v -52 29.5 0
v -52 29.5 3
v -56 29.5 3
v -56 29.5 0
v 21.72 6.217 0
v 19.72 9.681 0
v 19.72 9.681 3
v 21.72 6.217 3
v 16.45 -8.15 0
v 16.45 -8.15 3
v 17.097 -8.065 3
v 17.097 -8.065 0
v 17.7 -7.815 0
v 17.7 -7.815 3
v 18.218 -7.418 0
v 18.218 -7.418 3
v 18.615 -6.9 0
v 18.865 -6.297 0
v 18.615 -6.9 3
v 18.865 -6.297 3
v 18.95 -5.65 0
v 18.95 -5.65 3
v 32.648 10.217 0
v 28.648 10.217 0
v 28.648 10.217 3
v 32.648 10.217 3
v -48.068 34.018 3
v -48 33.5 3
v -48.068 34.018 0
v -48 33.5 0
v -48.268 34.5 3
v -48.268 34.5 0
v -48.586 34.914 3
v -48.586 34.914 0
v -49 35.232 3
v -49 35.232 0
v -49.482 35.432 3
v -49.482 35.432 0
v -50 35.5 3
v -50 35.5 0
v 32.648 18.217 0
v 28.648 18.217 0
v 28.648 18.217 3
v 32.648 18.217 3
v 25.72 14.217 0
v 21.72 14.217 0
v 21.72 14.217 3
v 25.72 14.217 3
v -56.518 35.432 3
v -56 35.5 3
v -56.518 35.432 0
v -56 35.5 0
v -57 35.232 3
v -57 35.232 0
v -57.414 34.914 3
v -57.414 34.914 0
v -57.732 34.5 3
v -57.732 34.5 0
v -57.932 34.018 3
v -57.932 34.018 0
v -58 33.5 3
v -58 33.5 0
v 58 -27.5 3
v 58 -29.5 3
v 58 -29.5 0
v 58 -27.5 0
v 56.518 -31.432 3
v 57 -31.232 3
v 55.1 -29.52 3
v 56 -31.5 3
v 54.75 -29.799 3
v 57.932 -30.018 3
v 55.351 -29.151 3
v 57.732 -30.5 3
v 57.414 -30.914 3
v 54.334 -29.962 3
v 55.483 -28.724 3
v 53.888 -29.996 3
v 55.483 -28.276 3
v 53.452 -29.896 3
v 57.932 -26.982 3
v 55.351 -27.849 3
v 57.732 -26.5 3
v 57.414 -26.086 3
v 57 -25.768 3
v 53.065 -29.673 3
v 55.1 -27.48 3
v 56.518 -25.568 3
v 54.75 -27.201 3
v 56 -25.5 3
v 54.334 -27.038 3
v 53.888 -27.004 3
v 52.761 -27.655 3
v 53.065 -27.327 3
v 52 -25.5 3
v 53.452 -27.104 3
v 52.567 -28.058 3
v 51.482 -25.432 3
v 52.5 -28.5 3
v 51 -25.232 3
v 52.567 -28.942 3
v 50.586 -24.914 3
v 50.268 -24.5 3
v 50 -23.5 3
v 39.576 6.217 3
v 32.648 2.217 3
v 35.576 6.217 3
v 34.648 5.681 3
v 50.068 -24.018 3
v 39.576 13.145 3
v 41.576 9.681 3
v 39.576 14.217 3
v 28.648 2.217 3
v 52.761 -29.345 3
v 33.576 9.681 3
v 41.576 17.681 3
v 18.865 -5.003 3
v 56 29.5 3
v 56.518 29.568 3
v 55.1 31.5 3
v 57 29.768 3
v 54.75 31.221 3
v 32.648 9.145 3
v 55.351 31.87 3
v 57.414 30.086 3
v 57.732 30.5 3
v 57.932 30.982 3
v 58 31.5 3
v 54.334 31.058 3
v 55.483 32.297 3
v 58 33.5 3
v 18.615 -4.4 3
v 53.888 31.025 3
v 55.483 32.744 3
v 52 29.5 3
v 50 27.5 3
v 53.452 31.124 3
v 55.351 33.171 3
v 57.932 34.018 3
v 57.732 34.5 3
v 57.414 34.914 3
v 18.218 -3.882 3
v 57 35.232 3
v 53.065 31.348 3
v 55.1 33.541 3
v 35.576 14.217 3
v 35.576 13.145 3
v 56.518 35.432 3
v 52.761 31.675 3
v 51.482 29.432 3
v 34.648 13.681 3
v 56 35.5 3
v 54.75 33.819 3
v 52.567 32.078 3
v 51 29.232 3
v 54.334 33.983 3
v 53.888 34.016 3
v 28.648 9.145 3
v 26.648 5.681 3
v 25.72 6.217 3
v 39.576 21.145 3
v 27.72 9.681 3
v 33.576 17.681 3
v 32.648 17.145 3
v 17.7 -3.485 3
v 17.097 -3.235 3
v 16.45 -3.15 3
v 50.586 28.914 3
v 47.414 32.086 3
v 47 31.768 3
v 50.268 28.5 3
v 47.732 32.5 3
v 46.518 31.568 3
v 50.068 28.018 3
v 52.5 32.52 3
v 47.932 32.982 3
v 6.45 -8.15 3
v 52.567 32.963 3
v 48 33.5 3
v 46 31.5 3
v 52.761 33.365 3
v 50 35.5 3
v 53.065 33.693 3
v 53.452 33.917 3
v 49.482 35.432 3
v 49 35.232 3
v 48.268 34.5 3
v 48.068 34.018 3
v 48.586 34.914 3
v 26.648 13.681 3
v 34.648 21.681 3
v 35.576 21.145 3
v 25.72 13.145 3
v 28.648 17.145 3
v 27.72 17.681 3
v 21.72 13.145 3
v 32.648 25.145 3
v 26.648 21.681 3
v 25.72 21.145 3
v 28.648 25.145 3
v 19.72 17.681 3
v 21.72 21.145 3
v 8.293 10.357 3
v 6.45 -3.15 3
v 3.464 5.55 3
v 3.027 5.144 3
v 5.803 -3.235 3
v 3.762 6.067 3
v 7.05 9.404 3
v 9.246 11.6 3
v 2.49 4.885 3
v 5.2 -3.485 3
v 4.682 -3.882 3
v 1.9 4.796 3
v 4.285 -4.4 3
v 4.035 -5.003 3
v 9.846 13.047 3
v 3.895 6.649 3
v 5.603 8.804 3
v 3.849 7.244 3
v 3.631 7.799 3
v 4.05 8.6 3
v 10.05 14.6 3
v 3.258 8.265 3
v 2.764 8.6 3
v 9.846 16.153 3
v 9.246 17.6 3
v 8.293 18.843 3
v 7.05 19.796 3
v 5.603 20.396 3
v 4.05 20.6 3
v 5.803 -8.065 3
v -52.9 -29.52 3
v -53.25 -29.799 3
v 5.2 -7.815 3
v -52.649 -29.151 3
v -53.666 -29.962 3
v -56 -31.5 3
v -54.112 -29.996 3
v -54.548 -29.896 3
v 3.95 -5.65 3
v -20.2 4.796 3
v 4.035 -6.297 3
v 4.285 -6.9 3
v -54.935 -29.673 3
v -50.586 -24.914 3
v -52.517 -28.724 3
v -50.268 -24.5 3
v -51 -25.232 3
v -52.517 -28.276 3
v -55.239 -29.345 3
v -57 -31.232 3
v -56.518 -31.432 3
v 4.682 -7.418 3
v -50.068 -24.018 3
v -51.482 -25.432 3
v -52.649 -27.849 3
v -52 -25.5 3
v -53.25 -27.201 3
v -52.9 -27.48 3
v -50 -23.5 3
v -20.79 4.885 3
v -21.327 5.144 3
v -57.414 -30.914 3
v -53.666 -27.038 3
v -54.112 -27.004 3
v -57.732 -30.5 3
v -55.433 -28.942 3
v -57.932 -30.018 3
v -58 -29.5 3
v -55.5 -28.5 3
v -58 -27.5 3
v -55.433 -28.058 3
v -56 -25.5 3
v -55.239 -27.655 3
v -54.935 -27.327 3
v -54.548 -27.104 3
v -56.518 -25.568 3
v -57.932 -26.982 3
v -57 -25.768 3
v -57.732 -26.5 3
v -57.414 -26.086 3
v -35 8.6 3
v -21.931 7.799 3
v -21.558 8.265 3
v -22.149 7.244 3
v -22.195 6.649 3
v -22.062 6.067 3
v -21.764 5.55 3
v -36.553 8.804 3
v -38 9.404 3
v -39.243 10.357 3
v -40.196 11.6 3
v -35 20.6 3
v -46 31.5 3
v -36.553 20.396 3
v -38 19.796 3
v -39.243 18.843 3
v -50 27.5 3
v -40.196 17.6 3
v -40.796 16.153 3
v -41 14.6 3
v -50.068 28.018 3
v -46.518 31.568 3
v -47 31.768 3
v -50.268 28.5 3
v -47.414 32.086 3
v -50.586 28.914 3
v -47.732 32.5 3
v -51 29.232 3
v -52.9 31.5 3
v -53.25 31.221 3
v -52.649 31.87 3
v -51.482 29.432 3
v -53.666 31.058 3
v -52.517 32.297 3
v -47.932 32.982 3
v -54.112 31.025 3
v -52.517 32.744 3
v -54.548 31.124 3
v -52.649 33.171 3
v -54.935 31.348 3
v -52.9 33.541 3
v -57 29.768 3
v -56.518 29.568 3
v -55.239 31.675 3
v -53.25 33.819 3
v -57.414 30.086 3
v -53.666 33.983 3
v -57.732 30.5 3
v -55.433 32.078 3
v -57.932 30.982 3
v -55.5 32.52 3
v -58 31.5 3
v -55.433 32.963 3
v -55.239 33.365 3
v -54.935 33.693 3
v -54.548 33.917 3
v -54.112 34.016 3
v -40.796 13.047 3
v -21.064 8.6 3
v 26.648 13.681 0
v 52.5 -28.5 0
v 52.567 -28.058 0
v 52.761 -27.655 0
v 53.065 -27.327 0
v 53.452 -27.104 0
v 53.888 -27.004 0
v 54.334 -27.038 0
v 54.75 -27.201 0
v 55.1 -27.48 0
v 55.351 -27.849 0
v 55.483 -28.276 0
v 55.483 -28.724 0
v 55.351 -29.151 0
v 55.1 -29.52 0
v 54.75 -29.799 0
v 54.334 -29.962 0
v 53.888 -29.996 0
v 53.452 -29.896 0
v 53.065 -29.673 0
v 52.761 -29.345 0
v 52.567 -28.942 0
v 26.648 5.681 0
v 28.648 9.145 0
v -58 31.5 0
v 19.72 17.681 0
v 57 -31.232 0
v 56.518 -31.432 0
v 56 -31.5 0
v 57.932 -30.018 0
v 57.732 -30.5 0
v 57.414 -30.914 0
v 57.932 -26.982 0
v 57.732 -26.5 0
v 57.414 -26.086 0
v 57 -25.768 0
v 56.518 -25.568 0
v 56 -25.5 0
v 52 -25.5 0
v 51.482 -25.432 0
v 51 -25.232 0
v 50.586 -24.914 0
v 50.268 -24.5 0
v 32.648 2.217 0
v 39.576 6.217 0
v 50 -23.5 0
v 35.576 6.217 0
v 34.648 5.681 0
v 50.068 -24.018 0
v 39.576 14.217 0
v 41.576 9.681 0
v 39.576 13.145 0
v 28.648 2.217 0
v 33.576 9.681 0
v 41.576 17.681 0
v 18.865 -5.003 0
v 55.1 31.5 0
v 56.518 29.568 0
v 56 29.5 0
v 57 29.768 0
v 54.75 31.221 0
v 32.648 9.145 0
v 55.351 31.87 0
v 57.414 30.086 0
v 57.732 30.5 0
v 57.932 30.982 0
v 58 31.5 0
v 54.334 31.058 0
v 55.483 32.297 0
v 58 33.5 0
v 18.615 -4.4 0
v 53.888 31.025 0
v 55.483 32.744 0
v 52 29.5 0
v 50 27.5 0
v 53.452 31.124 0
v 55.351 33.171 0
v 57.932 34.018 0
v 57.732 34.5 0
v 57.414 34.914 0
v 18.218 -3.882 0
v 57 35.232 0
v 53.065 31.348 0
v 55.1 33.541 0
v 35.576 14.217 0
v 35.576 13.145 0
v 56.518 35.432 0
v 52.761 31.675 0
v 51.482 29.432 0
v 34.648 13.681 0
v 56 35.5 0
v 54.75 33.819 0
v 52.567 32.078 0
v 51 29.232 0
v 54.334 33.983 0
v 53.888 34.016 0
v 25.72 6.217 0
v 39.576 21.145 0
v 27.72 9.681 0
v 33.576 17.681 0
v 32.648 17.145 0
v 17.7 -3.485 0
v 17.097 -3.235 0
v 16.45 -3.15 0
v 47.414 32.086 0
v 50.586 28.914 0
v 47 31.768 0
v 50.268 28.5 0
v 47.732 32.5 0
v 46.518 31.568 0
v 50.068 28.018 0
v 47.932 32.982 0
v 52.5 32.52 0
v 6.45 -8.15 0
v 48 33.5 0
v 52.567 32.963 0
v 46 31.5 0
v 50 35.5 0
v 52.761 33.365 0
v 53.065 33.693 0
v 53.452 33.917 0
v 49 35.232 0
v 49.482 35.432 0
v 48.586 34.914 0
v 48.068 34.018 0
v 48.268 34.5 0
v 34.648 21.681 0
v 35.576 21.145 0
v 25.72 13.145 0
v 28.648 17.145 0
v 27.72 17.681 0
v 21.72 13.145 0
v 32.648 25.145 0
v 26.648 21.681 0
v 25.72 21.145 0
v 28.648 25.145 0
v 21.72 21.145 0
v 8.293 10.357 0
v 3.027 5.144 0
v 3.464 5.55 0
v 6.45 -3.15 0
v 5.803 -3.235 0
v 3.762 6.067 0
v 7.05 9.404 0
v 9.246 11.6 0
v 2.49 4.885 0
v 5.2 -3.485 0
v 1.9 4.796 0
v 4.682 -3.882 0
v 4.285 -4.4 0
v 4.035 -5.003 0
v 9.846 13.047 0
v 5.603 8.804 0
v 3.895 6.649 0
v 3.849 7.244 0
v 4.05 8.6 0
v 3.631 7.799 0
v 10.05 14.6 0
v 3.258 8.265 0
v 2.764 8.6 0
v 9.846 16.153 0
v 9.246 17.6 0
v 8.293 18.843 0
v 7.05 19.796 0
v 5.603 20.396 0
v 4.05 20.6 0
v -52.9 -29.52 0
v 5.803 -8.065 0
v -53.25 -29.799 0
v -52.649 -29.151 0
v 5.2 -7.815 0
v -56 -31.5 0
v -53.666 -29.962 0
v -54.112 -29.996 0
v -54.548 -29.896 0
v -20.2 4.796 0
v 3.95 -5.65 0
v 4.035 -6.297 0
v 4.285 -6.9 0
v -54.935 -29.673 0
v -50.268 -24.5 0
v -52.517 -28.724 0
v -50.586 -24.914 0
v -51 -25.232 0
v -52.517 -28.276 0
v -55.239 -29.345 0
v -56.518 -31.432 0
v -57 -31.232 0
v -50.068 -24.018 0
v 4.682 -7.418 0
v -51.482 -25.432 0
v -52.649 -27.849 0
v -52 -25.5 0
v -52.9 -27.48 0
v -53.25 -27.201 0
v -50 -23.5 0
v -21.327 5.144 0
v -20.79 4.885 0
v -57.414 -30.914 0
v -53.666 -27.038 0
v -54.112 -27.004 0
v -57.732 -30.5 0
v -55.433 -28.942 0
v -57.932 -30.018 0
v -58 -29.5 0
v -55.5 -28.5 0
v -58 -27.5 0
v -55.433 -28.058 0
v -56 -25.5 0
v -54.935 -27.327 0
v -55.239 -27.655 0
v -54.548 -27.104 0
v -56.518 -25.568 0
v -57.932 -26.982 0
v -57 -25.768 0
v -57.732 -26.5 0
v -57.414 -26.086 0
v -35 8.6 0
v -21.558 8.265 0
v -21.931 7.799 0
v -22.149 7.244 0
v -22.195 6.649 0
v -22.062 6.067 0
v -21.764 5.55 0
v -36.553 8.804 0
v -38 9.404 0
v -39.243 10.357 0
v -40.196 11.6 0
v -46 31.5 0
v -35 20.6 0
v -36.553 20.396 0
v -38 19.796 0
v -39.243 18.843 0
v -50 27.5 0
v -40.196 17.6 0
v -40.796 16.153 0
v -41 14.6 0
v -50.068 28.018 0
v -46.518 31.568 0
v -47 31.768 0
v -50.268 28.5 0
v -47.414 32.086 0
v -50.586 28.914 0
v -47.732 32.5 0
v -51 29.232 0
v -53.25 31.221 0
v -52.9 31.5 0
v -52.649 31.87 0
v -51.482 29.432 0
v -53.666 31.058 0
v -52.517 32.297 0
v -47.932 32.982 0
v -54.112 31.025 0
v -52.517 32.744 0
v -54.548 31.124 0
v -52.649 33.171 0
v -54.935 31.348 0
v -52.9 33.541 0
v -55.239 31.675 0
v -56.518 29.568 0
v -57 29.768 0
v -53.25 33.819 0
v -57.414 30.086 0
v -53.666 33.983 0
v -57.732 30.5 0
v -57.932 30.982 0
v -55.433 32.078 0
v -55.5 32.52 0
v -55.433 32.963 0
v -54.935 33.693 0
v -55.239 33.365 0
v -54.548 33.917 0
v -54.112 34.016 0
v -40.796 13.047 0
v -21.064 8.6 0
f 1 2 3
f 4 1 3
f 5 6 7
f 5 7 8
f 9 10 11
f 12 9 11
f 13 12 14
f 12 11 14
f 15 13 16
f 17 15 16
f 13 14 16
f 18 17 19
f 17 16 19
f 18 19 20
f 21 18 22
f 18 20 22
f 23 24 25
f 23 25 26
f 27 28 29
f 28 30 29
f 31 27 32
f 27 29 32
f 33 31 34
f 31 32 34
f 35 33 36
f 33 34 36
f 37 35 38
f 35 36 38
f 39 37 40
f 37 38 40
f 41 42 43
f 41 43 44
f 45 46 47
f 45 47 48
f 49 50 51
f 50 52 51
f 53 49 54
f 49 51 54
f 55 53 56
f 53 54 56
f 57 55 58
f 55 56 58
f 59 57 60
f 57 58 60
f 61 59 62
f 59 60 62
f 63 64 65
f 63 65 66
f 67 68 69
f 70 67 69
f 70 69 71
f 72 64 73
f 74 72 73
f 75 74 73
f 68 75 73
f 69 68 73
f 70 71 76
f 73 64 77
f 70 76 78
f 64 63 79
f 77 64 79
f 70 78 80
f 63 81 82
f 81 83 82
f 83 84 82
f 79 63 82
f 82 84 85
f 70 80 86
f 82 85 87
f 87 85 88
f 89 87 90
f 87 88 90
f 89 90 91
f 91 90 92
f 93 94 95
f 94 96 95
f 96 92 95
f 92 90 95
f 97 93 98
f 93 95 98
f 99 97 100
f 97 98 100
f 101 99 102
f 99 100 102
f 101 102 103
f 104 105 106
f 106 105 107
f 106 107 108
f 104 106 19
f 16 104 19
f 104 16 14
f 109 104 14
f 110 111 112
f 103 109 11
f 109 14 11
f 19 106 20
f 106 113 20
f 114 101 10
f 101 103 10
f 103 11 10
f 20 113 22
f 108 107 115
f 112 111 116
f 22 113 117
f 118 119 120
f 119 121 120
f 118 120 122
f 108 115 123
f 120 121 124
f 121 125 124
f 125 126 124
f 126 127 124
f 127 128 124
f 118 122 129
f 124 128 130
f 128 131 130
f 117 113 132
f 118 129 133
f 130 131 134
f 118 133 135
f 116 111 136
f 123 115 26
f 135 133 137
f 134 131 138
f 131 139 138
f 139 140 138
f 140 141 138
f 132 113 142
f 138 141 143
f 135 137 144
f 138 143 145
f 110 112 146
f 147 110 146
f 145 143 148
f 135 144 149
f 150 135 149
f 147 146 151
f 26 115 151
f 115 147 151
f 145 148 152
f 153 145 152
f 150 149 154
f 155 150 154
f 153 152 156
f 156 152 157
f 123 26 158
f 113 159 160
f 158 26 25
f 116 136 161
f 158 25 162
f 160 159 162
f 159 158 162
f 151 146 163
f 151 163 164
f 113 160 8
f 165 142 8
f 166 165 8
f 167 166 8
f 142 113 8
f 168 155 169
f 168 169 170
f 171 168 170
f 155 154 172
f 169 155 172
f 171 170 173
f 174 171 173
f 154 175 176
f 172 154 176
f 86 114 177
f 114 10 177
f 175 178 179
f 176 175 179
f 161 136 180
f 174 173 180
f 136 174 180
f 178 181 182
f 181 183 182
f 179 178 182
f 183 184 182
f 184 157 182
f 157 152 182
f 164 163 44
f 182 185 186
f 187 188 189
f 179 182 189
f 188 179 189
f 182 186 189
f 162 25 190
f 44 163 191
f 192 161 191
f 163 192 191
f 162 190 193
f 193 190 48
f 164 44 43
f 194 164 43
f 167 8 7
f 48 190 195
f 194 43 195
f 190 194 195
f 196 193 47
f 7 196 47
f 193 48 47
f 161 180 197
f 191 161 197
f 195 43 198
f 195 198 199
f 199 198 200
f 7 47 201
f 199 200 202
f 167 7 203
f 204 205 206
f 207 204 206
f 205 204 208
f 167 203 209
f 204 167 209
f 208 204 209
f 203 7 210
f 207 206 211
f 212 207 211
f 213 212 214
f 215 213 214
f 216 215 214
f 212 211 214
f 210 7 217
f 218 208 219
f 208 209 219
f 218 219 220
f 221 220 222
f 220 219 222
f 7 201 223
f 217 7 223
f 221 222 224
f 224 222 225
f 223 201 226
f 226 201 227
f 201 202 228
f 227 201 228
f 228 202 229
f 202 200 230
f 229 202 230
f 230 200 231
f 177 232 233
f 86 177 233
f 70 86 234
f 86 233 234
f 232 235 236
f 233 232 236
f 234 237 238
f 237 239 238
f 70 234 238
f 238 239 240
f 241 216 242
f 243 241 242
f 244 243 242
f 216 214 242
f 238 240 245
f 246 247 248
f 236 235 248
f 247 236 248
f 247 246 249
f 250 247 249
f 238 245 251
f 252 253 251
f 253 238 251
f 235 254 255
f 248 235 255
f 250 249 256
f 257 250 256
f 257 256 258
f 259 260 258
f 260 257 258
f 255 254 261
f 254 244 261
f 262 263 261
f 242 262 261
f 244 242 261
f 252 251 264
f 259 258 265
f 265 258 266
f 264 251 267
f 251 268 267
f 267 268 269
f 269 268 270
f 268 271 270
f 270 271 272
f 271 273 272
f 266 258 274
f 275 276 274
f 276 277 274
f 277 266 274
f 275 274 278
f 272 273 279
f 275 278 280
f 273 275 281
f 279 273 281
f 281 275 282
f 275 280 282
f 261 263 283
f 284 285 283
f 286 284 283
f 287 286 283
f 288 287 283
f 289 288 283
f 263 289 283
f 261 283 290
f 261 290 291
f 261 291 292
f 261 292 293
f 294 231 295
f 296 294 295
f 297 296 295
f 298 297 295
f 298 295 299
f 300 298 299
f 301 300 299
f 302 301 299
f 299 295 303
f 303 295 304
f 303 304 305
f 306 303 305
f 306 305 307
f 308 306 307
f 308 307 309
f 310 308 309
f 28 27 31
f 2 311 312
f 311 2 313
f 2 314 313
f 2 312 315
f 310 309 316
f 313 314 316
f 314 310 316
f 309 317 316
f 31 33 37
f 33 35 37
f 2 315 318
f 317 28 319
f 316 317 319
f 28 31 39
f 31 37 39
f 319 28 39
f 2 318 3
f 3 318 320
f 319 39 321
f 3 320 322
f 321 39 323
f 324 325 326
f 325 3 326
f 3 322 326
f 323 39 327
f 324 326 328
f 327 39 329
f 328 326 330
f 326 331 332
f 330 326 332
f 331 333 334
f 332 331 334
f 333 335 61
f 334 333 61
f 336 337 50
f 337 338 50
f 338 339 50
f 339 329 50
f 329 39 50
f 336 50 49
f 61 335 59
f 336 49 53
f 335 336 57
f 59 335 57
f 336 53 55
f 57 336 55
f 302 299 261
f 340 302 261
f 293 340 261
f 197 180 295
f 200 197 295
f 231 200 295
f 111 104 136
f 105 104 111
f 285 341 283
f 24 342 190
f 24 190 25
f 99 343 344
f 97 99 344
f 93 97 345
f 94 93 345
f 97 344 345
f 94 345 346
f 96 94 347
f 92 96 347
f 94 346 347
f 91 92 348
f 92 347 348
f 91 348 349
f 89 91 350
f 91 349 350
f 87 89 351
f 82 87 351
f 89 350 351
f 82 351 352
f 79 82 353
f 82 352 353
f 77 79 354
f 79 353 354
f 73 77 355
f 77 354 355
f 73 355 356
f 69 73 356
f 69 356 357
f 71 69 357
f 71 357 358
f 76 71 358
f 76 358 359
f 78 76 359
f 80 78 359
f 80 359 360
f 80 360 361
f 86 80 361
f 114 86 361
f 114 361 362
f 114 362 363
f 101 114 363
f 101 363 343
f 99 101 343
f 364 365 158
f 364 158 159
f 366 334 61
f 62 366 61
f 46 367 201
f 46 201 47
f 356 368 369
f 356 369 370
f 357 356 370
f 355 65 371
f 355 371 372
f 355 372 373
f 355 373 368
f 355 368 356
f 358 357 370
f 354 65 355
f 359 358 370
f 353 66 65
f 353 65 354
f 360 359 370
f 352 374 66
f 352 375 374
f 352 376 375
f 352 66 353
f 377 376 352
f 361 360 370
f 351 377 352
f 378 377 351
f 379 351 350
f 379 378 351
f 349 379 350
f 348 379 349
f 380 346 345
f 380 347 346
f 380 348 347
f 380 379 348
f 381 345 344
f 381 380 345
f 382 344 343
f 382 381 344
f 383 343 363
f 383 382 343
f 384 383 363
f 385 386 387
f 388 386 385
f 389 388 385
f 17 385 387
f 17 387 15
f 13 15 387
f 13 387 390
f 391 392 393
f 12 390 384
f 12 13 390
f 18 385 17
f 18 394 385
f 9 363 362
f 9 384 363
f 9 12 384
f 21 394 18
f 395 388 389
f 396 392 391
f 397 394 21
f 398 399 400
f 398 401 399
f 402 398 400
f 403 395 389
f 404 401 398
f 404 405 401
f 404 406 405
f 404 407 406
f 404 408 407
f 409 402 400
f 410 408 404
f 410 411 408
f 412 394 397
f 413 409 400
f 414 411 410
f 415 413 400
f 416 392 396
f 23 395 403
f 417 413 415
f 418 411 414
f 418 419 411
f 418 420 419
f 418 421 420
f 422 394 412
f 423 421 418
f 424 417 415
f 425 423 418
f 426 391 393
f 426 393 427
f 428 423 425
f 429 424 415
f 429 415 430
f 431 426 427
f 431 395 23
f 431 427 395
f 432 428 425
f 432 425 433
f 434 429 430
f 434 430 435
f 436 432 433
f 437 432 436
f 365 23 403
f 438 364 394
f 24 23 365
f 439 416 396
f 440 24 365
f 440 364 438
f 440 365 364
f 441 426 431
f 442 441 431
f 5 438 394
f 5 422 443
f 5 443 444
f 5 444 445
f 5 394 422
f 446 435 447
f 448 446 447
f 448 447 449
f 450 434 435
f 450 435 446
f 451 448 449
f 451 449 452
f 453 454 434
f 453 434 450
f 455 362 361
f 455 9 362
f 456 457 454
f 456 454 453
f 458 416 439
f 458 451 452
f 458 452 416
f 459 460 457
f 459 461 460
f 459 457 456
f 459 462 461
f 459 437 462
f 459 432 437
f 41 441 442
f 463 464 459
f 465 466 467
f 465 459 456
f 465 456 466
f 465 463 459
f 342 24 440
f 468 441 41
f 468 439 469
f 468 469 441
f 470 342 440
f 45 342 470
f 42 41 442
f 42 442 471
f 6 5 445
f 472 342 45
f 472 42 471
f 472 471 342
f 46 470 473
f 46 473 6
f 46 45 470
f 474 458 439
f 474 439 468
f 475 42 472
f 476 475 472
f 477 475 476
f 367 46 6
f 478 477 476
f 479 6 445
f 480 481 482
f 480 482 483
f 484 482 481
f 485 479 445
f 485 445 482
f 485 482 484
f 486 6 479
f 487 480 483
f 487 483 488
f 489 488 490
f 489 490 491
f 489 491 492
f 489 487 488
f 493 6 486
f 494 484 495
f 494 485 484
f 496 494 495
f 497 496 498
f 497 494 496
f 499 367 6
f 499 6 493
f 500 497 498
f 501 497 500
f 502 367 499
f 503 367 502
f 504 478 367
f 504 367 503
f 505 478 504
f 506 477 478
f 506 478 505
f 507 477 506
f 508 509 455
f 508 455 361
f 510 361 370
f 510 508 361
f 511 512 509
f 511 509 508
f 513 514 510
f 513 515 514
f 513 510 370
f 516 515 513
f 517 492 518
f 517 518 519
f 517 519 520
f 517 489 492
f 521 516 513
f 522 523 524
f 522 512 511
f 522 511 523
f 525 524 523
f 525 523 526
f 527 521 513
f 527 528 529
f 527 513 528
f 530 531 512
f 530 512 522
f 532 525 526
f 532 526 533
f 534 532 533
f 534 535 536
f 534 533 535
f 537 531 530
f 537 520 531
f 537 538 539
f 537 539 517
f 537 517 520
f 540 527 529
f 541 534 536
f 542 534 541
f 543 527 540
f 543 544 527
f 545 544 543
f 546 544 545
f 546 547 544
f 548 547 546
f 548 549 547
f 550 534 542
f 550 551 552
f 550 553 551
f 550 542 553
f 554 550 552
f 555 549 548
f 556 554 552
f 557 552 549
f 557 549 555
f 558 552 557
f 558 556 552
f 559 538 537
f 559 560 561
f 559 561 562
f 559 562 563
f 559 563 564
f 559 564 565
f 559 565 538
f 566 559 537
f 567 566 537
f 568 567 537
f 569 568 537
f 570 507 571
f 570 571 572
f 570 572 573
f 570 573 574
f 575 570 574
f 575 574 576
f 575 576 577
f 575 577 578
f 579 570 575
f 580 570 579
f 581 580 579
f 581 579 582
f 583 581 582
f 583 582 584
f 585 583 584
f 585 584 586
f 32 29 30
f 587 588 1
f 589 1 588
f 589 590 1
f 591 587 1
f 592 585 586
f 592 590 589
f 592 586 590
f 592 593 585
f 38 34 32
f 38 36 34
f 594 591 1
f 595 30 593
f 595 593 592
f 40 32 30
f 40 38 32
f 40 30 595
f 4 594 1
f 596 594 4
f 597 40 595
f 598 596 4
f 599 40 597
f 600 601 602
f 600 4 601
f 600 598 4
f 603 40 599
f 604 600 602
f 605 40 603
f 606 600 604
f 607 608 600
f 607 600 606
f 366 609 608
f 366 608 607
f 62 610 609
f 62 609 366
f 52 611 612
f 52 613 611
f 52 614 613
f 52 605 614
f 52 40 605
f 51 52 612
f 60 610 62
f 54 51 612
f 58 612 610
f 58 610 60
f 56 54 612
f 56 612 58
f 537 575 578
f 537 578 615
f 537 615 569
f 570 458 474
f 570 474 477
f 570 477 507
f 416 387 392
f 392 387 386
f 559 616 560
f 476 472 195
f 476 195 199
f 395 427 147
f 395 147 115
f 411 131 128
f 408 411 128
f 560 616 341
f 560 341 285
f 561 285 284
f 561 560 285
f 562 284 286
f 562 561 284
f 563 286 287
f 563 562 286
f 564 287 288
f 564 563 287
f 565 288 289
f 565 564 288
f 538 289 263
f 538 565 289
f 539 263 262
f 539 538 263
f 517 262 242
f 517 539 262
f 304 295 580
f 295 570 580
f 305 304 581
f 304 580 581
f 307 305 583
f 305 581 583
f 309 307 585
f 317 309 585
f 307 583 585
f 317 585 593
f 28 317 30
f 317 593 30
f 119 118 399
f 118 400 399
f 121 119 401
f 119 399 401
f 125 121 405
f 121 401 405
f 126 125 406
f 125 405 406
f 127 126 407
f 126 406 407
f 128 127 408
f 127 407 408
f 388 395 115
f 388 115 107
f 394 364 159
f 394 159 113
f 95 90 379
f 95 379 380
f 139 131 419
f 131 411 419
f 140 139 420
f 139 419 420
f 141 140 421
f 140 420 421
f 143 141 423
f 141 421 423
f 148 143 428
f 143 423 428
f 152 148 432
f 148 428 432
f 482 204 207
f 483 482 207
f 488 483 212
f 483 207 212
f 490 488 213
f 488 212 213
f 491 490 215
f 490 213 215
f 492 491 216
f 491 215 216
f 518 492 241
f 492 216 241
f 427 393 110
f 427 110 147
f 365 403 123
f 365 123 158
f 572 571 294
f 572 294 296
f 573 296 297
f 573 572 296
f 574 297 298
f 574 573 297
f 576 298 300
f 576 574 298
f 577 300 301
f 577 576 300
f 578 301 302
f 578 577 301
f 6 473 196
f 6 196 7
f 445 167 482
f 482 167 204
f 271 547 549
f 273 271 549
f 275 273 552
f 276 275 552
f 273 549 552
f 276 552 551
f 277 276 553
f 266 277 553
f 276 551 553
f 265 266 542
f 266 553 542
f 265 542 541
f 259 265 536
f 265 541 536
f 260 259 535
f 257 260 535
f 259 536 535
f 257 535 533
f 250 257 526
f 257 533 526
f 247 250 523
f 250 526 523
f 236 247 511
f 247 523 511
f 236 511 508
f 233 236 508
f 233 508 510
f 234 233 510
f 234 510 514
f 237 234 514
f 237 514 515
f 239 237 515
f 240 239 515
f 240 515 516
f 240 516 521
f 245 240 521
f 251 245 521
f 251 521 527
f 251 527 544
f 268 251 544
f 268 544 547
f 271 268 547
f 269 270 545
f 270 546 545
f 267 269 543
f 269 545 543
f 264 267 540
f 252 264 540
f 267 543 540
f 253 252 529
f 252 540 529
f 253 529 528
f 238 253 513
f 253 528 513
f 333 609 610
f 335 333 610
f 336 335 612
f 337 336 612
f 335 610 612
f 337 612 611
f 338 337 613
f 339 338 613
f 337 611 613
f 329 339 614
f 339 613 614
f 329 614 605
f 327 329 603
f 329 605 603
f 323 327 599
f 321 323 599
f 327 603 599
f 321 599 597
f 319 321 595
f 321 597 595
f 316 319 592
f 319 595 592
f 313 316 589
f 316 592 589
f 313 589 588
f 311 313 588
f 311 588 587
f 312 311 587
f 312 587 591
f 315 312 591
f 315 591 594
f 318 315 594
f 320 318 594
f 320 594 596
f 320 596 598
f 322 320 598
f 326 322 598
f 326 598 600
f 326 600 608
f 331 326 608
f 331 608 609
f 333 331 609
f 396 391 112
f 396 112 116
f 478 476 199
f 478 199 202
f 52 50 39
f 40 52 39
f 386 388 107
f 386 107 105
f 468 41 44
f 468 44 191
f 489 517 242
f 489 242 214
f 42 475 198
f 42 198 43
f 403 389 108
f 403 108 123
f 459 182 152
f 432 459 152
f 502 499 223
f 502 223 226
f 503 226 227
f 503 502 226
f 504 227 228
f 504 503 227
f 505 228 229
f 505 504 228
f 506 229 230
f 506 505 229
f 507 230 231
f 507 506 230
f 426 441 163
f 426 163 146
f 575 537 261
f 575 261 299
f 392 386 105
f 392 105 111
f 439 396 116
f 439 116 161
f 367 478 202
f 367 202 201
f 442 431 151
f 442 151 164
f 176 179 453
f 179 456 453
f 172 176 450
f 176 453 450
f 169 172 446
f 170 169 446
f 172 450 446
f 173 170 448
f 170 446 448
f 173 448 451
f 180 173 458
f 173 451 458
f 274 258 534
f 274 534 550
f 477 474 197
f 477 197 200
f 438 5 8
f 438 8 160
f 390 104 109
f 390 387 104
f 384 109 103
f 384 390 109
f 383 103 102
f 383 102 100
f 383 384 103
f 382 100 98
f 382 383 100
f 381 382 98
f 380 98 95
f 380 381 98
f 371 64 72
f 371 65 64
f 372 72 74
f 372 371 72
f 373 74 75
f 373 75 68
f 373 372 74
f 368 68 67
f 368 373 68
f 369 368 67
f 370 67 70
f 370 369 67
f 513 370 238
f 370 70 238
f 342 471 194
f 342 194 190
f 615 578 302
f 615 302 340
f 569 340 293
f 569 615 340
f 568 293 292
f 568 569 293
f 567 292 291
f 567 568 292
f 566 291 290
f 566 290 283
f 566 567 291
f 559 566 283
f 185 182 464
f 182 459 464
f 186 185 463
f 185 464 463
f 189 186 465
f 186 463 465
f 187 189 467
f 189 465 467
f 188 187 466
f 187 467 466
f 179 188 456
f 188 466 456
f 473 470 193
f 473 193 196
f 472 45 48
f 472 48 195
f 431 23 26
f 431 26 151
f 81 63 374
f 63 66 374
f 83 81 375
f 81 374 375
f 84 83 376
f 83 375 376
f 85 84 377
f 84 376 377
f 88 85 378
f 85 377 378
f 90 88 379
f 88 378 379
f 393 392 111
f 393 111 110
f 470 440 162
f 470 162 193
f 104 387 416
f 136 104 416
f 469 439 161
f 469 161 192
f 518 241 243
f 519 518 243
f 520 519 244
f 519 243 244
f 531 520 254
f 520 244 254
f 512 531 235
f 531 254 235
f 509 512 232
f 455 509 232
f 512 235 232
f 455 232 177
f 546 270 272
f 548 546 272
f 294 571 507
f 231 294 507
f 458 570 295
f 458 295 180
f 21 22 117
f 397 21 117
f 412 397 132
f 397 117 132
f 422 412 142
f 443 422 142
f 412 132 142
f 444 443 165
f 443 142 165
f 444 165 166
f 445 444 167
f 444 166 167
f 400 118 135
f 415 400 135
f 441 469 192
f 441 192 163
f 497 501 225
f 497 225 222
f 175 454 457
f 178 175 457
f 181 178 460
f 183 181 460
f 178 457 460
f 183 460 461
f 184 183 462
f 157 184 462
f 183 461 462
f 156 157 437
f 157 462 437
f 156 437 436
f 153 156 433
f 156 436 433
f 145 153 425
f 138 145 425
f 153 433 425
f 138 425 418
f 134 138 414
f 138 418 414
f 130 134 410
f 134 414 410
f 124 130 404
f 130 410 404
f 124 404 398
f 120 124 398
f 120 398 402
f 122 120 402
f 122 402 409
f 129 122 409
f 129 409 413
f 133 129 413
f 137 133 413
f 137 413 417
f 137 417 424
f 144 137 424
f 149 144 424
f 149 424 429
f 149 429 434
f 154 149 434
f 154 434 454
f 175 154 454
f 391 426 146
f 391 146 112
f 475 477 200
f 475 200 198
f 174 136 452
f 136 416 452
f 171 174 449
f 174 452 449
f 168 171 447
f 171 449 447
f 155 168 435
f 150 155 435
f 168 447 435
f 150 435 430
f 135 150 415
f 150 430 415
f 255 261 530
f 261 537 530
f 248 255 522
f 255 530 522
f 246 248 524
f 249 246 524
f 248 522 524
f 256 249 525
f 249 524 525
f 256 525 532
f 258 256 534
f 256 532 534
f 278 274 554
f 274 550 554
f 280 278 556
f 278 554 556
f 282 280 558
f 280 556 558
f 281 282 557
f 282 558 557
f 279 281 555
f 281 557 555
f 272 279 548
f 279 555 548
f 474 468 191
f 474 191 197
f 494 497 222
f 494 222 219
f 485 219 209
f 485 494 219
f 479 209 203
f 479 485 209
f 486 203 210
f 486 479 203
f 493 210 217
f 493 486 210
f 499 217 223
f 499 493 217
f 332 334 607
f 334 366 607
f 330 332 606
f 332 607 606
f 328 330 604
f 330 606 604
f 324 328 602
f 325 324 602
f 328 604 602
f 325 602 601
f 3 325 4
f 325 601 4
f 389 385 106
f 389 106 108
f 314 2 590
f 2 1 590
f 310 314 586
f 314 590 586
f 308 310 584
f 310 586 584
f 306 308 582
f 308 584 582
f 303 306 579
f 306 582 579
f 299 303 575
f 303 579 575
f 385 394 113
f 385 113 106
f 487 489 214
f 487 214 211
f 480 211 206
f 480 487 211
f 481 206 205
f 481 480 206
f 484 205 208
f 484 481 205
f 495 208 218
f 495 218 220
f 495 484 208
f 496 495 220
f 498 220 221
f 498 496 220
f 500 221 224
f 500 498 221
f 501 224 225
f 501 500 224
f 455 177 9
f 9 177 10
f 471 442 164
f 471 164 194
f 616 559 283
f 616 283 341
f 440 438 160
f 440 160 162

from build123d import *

# Parameters (mm, degrees)
SKETCH3_W           = 100
SKETCH3_H           = 63
BOSS_EXTRUDE1_DEPTH = 3
BOSS_EXTRUDE2_START = -3
SKETCH5_W           = 8
SKETCH5_H           = 6
BOSS_EXTRUDE2_DEPTH = 3
FILLET2_R           = 2
CUT_EXTRUDE1_DEPTH  = 3
CUT_EXTRUDE2_START  = -3
CUT_EXTRUDE2_DEPTH  = 3
CUT_EXTRUDE3_START  = -3
SKETCH8_W           = 39.05
SKETCH8_H           = 6
CUT_EXTRUDE3_DEPTH  = 3
SKETCH9_R           = 1.5
CUT_EXTRUDE4_DEPTH  = 10
FILL_PATTERN1_DEPTH = 3


# Read off the part's stored shape, not the designer's step: Cut-Extrude2, Fill Pattern1
with BuildPart() as part:
    # Sketch3 → Boss-Extrude1 (new body)
    with BuildSketch(Plane.XY):
        Rectangle(SKETCH3_W, SKETCH3_H)
    extrude(amount=BOSS_EXTRUDE1_DEPTH)

    # Sketch5 → Boss-Extrude2 (add)
    with BuildSketch(Plane(origin=(0, 0, 0), x_dir=(-1, 0, 0), z_dir=(0, 0, -1)).offset(BOSS_EXTRUDE2_START)):
        with Locations((-54, -28.5)):
            Rectangle(SKETCH5_W, SKETCH5_H)
        Polygon((-58, 29.5), (-50, 29.5), (-50, 31.5), (-48, 31.5), (-48, 35.5), (-58, 35.5), align=None)
        with Locations((54, -28.5)):
            Rectangle(SKETCH5_W, SKETCH5_H)
        Polygon((48, 35.5), (48, 31.5), (50, 31.5), (50, 29.5), (58, 29.5), (58, 35.5), align=None)
    extrude(amount=BOSS_EXTRUDE2_DEPTH)

    # Fillet2
    fillet2_edges = [part.edges().sort_by_distance(p)[0] for p in [
        (48, 35.5, 1.5),
        (58, 35.5, 1.5),
        (58, 29.5, 1.5),
        (50, 29.5, 1.5),
        (58, -31.5, 1.5),
        (58, -25.5, 1.5),
        (50, -25.5, 1.5),
        (-58, -31.5, 1.5),
        (-58, -25.5, 1.5),
        (-50, -25.5, 1.5),
        (-50, 29.5, 1.5),
        (-58, 29.5, 1.5),
        (-58, 35.5, 1.5),
        (-48, 35.5, 1.5),
        (-48, 31.5, 1.5),
        (48, 31.5, 1.5),
    ]]
    fillet(fillet2_edges, radius=FILLET2_R - 0.0001)  # a hair under: the kernel refuses the full size

    # Sketch6 → Cut-Extrude1 (cut)
    with BuildSketch(Plane.XY.offset(3)):
        with BuildLine():
            ThreePointArc((6.45, -3.15), (4.682233047, -3.882233047), (3.95, -5.65))
            Line((3.95, -5.65), (11.45, -5.65))
            Line((11.45, -5.65), (11.45, -3.15))
            Line((11.45, -3.15), (6.45, -3.15))
        make_face()
        with BuildLine():
            Line((11.45, -3.15), (11.45, -5.65))
            Line((11.45, -5.65), (18.95, -5.65))
            ThreePointArc((18.95, -5.65), (18.217766953, -3.882233047), (16.45, -3.15))
            Line((16.45, -3.15), (11.45, -3.15))
        make_face()
        with BuildLine():
            Line((18.95, -5.65), (11.45, -5.65))
            Line((11.45, -5.65), (11.45, -8.15))
            Line((11.45, -8.15), (16.45, -8.15))
            ThreePointArc((16.45, -8.15), (18.217766953, -7.417766953), (18.95, -5.65))
        make_face()
        with BuildLine():
            Line((11.45, -5.65), (3.95, -5.65))
            ThreePointArc((3.95, -5.65), (4.682233047, -7.417766953), (6.45, -8.15))
            Line((6.45, -8.15), (11.45, -8.15))
            Line((11.45, -8.15), (11.45, -5.65))
        make_face()
    extrude(amount=-CUT_EXTRUDE1_DEPTH, mode=Mode.SUBTRACT)

    # Cut-Extrude2 outline → Cut-Extrude2 (cut)
    with BuildSketch(Plane.XY.offset(3).offset(CUT_EXTRUDE2_START)):
        with BuildLine():
            Line((-11.2, 8.796347875), (-20.2, 8.796347875))
            ThreePointArc((-20.2, 8.796347875), (-22.2, 6.796347875), (-20.2, 4.796347875))
            Line((-20.2, 4.796347875), (1.9, 4.796347875))
            ThreePointArc((1.9, 4.796347875), (3.9, 6.796347875), (1.9, 8.796347875))
            Line((1.9, 8.796347875), (-11.19861108, 8.796347875))
            Line((-11.19861108, 8.796347875), (-11.2, 8.796347875))
        make_face()
    extrude(amount=CUT_EXTRUDE2_DEPTH, mode=Mode.SUBTRACT)

    # Sketch8 → Cut-Extrude3 (cut)
    with BuildSketch(Plane.XY.offset(3).offset(CUT_EXTRUDE3_START)):
        with BuildLine():
            Line((4.05, 14.6), (-35, 14.6))
            Line((-35, 14.6), (-35, 8.6))
            Line((-35, 8.6), (-21.064198479, 8.6))
            ThreePointArc((-21.064198479, 8.6), (-20.643111582, 8.746643269), (-20.2, 8.796347875))
            Line((-20.2, 8.796347875), (-11.2, 8.796347875))
            Line((-11.2, 8.796347875), (-11.19861108, 8.796347392))
            Line((-11.19861108, 8.796347392), (1.9, 8.796347875))
            ThreePointArc((1.9, 8.796347875), (2.343111582, 8.746643269), (2.764198479, 8.6))
            Line((2.764198479, 8.6), (4.05, 8.6))
            Line((4.05, 8.6), (4.05, 14.6))
        make_face()
        with BuildLine():
            ThreePointArc((-35, 20.6), (-39.242640687, 18.842640687), (-41, 14.6))
            Line((-41, 14.6), (-35, 14.6))
            Line((-35, 14.6), (-35, 20.6))
        make_face()
        with BuildLine():
            Line((-35, 14.6), (-41, 14.6))
            ThreePointArc((-41, 14.6), (-39.242640687, 10.357359313), (-35, 8.6))
            Line((-35, 8.6), (-35, 14.6))
        make_face()
        with Locations((-15.475, 17.6)):
            Rectangle(SKETCH8_W, SKETCH8_H)
        with BuildLine():
            Line((4.05, 20.6), (4.05, 14.6))
            Line((4.05, 14.6), (10.05, 14.6))
            ThreePointArc((10.05, 14.6), (8.292640687, 18.842640687), (4.05, 20.6))
        make_face()
        with BuildLine():
            Line((10.05, 14.6), (4.05, 14.6))
            Line((4.05, 14.6), (4.05, 8.6))
            ThreePointArc((4.05, 8.6), (8.292640687, 10.357359313), (10.05, 14.6))
        make_face()
    extrude(amount=CUT_EXTRUDE3_DEPTH, mode=Mode.SUBTRACT)

    # Sketch9 → Cut-Extrude4 (cut)
    with BuildSketch(Plane(origin=(0, 0, 0), x_dir=(-1, 0, 0), z_dir=(0, 0, -1))):
        with Locations((-54, 32.520438715)):
            Circle(SKETCH9_R)
        with Locations((54, 32.520438715)):
            Circle(SKETCH9_R)
        with Locations((-54, -28.5)):
            Circle(SKETCH9_R)
        with Locations((54, -28.5)):
            Circle(SKETCH9_R)
    extrude(amount=-CUT_EXTRUDE4_DEPTH, mode=Mode.SUBTRACT)

    # Fill Pattern1 outline → Fill Pattern1 (cut)
    with BuildSketch(Plane.XY):
        Polygon((34.648052979, 5.68067969), (32.648052979, 9.144781305), (28.648052979, 9.144781305), (26.648052979, 5.68067969), (28.648052979, 2.216578074), (32.648052979, 2.216578074), align=None)
        Polygon((27.719849748, 17.68067969), (25.719849748, 21.144781305), (21.719849748, 21.144781305), (19.719849748, 17.68067969), (21.719849748, 14.216578074), (25.719849748, 14.216578074), align=None)
        Polygon((35.576256209, 21.144781305), (33.576256209, 17.68067969), (35.576256209, 14.216578074), (39.576256209, 14.216578074), (41.576256209, 17.68067969), (39.576256209, 21.144781305), align=None)
        Polygon((34.648052979, 21.68067969), (32.648052979, 25.144781305), (28.648052979, 25.144781305), (26.648052979, 21.68067969), (28.648052979, 18.216578074), (32.648052979, 18.216578074), align=None)
        Polygon((41.576256209, 9.68067969), (39.576256209, 13.144781305), (35.576256209, 13.144781305), (33.576256209, 9.68067969), (35.576256209, 6.216578074), (39.576256209, 6.216578074), align=None)
        Polygon((21.719849748, 13.144781305), (19.719849748, 9.68067969), (21.719849748, 6.216578074), (25.719849748, 6.216578074), (27.719849748, 9.68067969), (25.719849748, 13.144781305), align=None)
        Polygon((34.648052979, 13.68067969), (32.648052979, 17.144781305), (28.648052979, 17.144781305), (26.648052979, 13.68067969), (28.648052979, 10.216578074), (32.648052979, 10.216578074), align=None)
    extrude(amount=FILL_PATTERN1_DEPTH, mode=Mode.SUBTRACT)


solid = part.part
